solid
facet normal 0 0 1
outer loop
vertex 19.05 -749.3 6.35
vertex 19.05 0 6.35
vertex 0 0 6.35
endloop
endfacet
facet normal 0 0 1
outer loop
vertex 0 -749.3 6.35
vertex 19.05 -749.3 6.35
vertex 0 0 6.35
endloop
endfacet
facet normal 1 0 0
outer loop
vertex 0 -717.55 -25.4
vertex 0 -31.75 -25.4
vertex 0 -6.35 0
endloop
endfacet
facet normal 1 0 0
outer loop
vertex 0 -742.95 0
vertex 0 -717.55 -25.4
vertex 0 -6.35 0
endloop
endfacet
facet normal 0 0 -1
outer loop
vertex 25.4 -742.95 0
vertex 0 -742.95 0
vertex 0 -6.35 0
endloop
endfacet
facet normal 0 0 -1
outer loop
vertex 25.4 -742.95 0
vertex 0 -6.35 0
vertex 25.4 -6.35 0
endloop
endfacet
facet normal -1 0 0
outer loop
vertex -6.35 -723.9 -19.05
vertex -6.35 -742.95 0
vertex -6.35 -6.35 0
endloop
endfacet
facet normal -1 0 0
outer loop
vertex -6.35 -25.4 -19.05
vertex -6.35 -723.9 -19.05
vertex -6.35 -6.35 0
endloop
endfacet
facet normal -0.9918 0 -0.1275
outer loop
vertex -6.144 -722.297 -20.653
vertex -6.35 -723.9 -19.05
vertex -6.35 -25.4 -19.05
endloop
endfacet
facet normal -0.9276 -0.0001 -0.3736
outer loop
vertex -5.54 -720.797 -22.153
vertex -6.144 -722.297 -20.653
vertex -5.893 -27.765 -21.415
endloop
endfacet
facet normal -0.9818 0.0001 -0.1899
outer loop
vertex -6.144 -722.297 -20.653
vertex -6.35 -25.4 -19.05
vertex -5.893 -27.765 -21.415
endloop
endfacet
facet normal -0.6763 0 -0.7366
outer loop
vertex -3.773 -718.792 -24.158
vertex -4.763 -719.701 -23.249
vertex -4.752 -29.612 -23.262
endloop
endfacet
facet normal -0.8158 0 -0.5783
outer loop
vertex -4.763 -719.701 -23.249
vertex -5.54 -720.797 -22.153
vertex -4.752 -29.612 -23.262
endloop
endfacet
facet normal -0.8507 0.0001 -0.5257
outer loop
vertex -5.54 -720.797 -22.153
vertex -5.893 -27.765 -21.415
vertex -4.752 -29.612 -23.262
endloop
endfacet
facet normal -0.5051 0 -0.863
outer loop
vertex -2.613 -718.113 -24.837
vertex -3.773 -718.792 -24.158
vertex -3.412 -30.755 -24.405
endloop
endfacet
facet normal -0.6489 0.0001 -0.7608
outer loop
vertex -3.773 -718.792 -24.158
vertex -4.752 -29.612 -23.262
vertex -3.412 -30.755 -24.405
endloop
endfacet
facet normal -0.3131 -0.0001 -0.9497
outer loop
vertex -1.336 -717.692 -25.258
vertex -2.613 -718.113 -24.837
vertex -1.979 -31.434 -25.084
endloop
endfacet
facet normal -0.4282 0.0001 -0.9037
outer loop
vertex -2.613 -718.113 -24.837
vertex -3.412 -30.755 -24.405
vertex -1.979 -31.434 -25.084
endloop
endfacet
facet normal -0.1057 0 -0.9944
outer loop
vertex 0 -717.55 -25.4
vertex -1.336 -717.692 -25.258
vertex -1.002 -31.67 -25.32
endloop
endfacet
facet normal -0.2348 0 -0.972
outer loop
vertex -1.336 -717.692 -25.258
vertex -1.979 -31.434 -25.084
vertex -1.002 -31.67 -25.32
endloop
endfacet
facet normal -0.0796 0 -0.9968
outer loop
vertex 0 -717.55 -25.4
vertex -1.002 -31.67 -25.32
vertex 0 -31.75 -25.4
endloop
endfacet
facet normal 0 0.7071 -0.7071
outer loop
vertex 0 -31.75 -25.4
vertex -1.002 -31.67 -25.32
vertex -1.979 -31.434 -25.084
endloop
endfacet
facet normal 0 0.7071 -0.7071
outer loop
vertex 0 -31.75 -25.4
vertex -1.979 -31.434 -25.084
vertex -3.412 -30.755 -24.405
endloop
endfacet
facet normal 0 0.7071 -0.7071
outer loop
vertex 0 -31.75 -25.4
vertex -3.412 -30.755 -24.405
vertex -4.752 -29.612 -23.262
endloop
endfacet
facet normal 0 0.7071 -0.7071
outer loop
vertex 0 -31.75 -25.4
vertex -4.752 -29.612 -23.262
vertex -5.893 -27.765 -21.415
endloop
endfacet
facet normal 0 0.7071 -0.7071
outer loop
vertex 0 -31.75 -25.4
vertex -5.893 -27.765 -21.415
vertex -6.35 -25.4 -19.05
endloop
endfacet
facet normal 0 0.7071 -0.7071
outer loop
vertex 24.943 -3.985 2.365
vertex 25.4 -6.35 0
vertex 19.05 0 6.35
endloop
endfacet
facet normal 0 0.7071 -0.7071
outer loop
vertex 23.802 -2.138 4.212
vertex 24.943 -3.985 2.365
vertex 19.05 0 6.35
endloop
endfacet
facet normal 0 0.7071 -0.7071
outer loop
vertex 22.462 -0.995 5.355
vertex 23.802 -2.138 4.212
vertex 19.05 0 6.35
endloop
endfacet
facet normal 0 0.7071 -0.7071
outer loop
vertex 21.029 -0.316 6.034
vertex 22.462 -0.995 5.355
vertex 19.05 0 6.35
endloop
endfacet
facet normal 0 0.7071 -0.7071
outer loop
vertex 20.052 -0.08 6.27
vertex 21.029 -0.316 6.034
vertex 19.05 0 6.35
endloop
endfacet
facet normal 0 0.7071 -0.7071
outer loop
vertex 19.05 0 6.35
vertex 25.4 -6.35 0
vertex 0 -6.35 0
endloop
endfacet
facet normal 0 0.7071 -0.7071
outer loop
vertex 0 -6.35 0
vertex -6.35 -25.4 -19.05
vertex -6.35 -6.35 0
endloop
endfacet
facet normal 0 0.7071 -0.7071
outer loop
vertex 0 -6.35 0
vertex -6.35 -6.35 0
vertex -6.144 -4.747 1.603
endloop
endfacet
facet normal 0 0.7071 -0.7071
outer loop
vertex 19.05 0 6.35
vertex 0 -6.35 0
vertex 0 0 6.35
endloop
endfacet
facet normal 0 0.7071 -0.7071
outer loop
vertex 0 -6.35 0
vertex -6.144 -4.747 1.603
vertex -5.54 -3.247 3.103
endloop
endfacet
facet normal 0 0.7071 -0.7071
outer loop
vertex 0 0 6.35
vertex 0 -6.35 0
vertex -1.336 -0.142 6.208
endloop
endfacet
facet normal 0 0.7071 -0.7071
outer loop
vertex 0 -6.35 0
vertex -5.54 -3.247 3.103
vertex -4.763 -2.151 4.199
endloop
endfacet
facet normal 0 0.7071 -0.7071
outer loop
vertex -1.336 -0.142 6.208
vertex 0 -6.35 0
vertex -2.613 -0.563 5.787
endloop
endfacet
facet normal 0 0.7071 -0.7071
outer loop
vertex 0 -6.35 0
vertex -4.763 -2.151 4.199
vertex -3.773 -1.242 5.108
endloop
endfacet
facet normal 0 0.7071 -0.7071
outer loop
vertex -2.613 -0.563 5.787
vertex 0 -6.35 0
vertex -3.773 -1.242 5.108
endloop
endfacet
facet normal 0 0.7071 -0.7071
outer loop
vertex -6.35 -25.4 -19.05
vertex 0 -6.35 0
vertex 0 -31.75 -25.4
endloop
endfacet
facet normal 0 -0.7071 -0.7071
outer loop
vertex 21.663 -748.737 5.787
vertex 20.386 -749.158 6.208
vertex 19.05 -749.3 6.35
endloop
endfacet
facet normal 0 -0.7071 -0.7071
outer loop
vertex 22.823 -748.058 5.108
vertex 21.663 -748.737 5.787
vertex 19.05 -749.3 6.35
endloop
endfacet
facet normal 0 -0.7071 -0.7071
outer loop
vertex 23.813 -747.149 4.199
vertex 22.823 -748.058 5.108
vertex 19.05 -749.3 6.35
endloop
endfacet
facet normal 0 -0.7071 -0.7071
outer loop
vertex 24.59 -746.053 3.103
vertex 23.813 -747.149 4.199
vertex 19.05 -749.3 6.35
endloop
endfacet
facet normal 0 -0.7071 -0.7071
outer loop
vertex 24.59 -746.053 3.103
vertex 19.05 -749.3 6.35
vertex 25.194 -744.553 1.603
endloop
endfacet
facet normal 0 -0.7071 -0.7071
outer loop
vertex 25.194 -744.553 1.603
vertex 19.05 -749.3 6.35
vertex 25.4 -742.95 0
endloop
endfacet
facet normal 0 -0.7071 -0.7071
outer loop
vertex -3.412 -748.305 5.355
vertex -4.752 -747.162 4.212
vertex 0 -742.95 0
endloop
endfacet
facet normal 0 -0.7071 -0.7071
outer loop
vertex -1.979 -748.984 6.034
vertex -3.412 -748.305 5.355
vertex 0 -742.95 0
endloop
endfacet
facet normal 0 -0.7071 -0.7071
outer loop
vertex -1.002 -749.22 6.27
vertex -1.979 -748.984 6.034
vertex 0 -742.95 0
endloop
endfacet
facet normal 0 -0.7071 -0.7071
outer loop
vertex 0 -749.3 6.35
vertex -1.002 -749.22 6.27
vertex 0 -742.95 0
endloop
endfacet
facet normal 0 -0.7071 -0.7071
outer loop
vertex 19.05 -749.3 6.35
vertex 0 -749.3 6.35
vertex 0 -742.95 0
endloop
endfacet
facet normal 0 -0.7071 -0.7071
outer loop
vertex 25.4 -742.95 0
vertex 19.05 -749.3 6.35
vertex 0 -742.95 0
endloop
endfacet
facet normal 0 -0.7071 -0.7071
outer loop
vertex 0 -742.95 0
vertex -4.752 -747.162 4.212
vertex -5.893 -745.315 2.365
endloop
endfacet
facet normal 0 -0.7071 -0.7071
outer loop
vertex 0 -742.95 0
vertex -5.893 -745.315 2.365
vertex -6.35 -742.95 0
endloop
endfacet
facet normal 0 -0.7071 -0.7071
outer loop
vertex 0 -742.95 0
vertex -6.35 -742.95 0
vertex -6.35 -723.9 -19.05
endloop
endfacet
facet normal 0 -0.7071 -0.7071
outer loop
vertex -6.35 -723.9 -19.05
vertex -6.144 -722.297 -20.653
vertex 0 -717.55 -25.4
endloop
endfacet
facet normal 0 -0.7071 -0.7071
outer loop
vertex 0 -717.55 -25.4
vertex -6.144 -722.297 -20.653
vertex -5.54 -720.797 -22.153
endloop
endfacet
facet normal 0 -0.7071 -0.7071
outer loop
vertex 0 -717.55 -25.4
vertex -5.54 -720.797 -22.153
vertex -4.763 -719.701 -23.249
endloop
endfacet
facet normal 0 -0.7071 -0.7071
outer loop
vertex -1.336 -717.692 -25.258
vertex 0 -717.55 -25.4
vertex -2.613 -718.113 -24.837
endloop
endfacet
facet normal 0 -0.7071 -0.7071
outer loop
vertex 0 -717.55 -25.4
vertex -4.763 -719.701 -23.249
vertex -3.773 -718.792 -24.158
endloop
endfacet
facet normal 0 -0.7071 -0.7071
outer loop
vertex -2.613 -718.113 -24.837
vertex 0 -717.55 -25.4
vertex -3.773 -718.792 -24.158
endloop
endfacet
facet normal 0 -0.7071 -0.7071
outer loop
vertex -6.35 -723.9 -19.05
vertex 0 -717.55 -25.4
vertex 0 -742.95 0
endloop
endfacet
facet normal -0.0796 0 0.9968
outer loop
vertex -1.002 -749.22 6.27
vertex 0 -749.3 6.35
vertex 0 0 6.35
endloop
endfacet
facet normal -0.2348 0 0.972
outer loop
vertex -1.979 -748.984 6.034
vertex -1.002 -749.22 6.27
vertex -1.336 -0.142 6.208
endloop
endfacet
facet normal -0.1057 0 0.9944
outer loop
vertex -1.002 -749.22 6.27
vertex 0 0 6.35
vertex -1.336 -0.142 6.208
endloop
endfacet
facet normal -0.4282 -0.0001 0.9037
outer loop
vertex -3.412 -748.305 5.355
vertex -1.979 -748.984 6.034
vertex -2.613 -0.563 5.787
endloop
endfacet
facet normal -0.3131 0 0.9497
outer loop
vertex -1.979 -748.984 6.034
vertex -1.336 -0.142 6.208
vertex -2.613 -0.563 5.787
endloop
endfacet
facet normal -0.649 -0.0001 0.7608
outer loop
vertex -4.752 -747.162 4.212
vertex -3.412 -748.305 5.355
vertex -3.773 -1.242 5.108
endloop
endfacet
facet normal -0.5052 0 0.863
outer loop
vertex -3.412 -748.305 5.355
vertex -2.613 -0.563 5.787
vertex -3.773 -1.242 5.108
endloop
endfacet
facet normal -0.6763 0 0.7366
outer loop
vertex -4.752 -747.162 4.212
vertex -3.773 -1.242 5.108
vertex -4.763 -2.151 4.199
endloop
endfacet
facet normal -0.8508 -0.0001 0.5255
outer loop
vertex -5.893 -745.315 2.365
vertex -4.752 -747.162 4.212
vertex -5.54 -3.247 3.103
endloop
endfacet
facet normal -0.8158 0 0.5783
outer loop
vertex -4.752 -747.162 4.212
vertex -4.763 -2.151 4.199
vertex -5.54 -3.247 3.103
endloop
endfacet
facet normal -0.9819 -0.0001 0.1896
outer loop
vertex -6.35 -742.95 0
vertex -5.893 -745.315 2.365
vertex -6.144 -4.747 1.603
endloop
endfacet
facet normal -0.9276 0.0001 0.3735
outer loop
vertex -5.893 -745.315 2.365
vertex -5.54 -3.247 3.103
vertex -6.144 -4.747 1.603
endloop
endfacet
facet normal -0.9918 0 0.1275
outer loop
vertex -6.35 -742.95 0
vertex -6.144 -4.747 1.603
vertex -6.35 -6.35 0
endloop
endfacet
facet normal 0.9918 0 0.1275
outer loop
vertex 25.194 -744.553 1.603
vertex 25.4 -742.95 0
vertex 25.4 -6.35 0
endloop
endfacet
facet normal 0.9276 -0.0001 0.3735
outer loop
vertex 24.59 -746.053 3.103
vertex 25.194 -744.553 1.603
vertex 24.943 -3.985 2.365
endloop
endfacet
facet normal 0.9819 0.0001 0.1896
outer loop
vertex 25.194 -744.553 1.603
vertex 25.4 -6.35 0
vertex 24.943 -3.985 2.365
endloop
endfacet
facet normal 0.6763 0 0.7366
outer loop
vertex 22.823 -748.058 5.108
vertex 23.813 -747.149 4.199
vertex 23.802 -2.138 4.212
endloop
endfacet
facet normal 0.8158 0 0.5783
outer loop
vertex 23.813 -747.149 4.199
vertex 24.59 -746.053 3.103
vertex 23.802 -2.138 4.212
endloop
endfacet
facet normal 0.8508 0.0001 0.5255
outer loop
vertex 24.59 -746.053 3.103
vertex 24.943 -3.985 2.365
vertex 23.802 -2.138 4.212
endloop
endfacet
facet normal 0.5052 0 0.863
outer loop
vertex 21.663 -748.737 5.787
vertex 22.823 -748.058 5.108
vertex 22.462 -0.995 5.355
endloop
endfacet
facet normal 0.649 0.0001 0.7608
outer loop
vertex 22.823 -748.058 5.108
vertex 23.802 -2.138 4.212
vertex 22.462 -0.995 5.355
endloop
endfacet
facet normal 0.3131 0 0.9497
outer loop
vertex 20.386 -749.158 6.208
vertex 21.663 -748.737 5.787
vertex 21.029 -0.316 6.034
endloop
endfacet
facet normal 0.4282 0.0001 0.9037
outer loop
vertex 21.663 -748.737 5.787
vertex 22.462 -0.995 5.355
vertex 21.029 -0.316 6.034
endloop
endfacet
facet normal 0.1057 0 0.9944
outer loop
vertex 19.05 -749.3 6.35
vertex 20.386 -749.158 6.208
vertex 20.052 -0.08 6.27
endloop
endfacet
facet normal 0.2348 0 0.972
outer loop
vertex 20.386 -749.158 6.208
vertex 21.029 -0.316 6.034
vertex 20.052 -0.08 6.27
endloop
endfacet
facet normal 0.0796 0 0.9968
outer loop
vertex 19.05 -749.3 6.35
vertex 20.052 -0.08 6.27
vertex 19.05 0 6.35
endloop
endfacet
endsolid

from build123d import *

# Parameters (mm, degrees)
F1_DEPTH = 749.3
F3_DEPTH = 31.751
F5_DEPTH = 50.8


with BuildPart() as f1:
    # F0 (on Front) → F1 (new body)
    with BuildSketch(Plane.XZ):
        with BuildLine():
            Line((0, -25.4), (0, 0))
            Line((0, 0), (25.4, 0))
            ThreePointArc((25.4, 0), (23.5401280605, 4.4901280605), (19.05, 6.35))
            Line((19.05, 6.35), (0, 6.35))
            ThreePointArc((0, 6.35), (-4.4901280605, 4.4901280605), (-6.35, 0))
            Line((-6.35, 0), (-6.35, -19.05))
            ThreePointArc((-6.35, -19.05), (-4.4901280605, -23.5401280605), (0, -25.4))
        make_face()
    extrude(amount=F1_DEPTH)

    # F2 (on face) → F3 (cut, through all)
    with BuildSketch(Plane(origin=(-6.35, 0, 0), x_dir=(0, -1, 0), z_dir=(-1, 0, 0))):
        Polygon((749.3, -25.4), (749.3, 6.35), (717.55, -25.4), align=None)
    extrude(amount=-F3_DEPTH, mode=Mode.SUBTRACT)

    # F4 (on face) → F5 (cut)
    with BuildSketch(Plane(origin=(-6.35, 0, 0), x_dir=(0, -1, 0), z_dir=(-1, 0, 0))):
        Polygon((31.75, -25.4), (25.4, -19.05), (0, -19.05), (0, -25.4), align=None)
        Polygon((25.4, -19.05), (6.35, 0), (0, 0), (0, -19.05), align=None)
        Polygon((6.35, 0), (0, 6.35), (0, 0), align=None)
    extrude(amount=-F5_DEPTH, mode=Mode.SUBTRACT)


solid = f1.part
